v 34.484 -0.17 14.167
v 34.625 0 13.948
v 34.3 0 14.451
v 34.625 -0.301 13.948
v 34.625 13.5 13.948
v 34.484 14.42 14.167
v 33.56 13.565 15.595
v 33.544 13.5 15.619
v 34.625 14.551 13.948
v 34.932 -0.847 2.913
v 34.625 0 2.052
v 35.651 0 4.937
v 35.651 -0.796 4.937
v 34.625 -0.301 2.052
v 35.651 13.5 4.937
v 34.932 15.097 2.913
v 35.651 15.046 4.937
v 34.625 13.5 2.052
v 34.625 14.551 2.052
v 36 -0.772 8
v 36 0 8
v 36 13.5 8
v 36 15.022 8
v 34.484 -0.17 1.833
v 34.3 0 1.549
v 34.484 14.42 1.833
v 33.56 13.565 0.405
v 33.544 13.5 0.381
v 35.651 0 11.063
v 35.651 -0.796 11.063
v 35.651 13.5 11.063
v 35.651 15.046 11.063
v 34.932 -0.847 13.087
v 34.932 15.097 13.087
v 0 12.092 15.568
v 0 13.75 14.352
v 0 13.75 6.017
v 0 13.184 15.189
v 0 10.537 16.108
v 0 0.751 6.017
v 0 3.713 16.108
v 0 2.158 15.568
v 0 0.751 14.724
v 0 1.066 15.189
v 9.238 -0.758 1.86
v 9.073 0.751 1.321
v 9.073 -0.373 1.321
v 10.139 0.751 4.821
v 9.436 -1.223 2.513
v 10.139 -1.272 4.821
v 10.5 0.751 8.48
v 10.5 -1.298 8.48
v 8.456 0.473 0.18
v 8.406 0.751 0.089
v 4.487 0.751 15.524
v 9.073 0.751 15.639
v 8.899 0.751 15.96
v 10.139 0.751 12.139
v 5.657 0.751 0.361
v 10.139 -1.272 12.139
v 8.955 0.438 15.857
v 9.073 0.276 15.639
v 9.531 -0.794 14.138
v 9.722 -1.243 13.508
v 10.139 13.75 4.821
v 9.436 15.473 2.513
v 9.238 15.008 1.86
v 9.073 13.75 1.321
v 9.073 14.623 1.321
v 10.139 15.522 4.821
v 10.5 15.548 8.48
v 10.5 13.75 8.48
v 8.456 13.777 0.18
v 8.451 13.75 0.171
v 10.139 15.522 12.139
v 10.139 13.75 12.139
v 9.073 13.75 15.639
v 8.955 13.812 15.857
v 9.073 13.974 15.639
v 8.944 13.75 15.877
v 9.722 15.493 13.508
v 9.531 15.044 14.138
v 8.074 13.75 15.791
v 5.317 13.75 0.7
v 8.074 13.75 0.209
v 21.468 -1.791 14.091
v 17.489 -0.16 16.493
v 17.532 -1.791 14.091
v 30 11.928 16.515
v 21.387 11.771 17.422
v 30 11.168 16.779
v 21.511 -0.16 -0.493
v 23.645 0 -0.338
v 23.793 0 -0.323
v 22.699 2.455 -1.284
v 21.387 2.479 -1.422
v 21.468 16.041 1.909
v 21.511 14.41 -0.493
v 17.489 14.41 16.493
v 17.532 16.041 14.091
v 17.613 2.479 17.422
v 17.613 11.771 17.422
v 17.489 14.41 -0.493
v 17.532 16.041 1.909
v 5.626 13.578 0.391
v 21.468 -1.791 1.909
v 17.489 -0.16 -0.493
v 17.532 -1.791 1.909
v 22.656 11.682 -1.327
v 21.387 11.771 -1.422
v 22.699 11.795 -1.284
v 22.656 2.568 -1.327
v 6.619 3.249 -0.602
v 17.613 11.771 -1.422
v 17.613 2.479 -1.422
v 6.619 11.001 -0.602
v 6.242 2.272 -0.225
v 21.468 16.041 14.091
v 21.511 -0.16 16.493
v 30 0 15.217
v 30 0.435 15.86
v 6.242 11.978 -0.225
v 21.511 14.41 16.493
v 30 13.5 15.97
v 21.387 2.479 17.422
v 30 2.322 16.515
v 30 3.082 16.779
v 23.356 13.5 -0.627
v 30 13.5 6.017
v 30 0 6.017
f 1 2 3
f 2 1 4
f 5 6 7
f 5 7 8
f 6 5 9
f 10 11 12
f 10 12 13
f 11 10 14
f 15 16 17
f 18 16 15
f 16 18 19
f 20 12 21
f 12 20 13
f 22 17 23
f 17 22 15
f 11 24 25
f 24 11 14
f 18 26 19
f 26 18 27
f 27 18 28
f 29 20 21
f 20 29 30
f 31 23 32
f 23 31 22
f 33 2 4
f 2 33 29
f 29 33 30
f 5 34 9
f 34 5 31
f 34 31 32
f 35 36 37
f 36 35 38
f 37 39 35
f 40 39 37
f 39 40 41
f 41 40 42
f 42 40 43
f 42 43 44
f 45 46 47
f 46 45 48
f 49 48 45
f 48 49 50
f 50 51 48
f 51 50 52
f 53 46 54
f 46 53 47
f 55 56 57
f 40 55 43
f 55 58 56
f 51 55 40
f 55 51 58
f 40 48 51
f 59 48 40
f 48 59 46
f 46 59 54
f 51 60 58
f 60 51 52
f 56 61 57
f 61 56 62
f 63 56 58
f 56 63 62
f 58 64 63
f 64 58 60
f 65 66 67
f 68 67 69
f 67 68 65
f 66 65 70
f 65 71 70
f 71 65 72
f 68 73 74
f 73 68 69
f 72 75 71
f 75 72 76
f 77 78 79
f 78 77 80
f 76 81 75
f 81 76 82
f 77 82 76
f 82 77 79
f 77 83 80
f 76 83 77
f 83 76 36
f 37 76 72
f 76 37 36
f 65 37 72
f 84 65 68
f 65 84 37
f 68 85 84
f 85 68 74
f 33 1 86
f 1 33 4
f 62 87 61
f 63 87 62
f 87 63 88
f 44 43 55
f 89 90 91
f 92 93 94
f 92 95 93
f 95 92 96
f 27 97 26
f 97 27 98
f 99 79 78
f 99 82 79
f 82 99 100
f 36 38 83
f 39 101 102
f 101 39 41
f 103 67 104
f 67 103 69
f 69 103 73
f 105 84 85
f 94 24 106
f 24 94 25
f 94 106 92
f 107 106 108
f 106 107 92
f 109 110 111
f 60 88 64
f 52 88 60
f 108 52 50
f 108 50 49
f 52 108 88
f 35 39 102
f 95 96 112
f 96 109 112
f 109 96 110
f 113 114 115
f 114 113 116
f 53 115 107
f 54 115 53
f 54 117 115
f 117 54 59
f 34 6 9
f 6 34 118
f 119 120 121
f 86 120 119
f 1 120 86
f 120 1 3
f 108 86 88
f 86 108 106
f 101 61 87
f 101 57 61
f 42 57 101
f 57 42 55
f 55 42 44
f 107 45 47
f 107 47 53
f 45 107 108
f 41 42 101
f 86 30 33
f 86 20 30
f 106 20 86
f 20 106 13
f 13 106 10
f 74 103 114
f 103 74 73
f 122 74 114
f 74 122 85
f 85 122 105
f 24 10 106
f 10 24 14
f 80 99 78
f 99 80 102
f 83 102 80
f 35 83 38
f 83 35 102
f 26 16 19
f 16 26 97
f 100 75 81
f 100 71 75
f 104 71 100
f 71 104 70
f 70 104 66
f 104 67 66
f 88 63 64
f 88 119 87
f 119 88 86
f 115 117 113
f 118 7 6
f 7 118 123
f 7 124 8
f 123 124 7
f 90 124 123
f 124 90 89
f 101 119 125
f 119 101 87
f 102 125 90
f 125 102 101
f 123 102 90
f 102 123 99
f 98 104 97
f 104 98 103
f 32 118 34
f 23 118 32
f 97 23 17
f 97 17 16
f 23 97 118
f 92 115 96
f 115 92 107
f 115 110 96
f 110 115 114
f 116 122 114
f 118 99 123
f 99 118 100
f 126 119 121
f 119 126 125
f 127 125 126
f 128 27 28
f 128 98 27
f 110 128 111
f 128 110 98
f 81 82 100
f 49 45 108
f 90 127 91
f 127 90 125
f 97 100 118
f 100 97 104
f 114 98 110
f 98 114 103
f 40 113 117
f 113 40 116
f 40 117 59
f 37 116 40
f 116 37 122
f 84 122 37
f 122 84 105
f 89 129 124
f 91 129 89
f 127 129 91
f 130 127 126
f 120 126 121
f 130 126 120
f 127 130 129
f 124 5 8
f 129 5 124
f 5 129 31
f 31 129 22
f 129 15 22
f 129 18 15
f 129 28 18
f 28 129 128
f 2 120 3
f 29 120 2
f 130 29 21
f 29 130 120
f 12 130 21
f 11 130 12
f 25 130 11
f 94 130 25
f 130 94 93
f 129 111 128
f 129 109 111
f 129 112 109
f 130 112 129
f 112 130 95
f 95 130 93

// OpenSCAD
module fingerbase(length,x,y,z,padding,width)
{ 
	difference() {
		scale([y,x,z]) {
			intersection() {
                difference() {
                    union() {
                        translate([length-4,-5,5]) rotate([-90,0,0]) cylinder(r=8,h=width + 10);
                        translate([0,-5,-5]) cube([length,width + 10,20]);
                    }
                    //cutout for the side
                        translate([-4,-width+0.001,5.3]) rotate([-90,0,0]) cylinder(r=11,h=10);
                        translate([-4,width - padding*(1/x),5.3]) rotate([-90,0,0]) cylinder(r=11,h=10);
                }
                
                hull() {
                    for(i=[-1,1], j=[-1,1]) {
                        //angled cylinders to provide the outer shape of the finger
                        translate([length/10,i*2.4 + width/2,j*2.2 + 5]) rotate([i*j*-4,j*86,0]) cylinder(d=6,h=20,center=true);
                        translate([length+4, i*2.4 + width/2, j*2.2 + 5]) rotate([i*j*-4,j*-86,0]) cylinder(d=6,h=20,center=true);
                    }
                }
            } 
		}
        translate([0,padding/2 * x,0])              
        fingerbasecutout(width-padding,x,z);
        translate([length * y,0,0]) 
        mirror([1,0,0])fingerbasecutout(width-padding,x,z);
	}
}

module fingerbasecutout(width,x,z) {
	//cubic parts
	translate([-100,0,0]) cube([100,width*x,100]);
	translate([-13/z,0,0]) rotate([0,45,0]) translate([-50,0,0]) cube([100,width*x, 10]);
}

//fingerbase(20,1.5,1.5,1.6,0.5,9.5);
fingerbase(20,1.5,1.5,1.6,0.5,9.5);
